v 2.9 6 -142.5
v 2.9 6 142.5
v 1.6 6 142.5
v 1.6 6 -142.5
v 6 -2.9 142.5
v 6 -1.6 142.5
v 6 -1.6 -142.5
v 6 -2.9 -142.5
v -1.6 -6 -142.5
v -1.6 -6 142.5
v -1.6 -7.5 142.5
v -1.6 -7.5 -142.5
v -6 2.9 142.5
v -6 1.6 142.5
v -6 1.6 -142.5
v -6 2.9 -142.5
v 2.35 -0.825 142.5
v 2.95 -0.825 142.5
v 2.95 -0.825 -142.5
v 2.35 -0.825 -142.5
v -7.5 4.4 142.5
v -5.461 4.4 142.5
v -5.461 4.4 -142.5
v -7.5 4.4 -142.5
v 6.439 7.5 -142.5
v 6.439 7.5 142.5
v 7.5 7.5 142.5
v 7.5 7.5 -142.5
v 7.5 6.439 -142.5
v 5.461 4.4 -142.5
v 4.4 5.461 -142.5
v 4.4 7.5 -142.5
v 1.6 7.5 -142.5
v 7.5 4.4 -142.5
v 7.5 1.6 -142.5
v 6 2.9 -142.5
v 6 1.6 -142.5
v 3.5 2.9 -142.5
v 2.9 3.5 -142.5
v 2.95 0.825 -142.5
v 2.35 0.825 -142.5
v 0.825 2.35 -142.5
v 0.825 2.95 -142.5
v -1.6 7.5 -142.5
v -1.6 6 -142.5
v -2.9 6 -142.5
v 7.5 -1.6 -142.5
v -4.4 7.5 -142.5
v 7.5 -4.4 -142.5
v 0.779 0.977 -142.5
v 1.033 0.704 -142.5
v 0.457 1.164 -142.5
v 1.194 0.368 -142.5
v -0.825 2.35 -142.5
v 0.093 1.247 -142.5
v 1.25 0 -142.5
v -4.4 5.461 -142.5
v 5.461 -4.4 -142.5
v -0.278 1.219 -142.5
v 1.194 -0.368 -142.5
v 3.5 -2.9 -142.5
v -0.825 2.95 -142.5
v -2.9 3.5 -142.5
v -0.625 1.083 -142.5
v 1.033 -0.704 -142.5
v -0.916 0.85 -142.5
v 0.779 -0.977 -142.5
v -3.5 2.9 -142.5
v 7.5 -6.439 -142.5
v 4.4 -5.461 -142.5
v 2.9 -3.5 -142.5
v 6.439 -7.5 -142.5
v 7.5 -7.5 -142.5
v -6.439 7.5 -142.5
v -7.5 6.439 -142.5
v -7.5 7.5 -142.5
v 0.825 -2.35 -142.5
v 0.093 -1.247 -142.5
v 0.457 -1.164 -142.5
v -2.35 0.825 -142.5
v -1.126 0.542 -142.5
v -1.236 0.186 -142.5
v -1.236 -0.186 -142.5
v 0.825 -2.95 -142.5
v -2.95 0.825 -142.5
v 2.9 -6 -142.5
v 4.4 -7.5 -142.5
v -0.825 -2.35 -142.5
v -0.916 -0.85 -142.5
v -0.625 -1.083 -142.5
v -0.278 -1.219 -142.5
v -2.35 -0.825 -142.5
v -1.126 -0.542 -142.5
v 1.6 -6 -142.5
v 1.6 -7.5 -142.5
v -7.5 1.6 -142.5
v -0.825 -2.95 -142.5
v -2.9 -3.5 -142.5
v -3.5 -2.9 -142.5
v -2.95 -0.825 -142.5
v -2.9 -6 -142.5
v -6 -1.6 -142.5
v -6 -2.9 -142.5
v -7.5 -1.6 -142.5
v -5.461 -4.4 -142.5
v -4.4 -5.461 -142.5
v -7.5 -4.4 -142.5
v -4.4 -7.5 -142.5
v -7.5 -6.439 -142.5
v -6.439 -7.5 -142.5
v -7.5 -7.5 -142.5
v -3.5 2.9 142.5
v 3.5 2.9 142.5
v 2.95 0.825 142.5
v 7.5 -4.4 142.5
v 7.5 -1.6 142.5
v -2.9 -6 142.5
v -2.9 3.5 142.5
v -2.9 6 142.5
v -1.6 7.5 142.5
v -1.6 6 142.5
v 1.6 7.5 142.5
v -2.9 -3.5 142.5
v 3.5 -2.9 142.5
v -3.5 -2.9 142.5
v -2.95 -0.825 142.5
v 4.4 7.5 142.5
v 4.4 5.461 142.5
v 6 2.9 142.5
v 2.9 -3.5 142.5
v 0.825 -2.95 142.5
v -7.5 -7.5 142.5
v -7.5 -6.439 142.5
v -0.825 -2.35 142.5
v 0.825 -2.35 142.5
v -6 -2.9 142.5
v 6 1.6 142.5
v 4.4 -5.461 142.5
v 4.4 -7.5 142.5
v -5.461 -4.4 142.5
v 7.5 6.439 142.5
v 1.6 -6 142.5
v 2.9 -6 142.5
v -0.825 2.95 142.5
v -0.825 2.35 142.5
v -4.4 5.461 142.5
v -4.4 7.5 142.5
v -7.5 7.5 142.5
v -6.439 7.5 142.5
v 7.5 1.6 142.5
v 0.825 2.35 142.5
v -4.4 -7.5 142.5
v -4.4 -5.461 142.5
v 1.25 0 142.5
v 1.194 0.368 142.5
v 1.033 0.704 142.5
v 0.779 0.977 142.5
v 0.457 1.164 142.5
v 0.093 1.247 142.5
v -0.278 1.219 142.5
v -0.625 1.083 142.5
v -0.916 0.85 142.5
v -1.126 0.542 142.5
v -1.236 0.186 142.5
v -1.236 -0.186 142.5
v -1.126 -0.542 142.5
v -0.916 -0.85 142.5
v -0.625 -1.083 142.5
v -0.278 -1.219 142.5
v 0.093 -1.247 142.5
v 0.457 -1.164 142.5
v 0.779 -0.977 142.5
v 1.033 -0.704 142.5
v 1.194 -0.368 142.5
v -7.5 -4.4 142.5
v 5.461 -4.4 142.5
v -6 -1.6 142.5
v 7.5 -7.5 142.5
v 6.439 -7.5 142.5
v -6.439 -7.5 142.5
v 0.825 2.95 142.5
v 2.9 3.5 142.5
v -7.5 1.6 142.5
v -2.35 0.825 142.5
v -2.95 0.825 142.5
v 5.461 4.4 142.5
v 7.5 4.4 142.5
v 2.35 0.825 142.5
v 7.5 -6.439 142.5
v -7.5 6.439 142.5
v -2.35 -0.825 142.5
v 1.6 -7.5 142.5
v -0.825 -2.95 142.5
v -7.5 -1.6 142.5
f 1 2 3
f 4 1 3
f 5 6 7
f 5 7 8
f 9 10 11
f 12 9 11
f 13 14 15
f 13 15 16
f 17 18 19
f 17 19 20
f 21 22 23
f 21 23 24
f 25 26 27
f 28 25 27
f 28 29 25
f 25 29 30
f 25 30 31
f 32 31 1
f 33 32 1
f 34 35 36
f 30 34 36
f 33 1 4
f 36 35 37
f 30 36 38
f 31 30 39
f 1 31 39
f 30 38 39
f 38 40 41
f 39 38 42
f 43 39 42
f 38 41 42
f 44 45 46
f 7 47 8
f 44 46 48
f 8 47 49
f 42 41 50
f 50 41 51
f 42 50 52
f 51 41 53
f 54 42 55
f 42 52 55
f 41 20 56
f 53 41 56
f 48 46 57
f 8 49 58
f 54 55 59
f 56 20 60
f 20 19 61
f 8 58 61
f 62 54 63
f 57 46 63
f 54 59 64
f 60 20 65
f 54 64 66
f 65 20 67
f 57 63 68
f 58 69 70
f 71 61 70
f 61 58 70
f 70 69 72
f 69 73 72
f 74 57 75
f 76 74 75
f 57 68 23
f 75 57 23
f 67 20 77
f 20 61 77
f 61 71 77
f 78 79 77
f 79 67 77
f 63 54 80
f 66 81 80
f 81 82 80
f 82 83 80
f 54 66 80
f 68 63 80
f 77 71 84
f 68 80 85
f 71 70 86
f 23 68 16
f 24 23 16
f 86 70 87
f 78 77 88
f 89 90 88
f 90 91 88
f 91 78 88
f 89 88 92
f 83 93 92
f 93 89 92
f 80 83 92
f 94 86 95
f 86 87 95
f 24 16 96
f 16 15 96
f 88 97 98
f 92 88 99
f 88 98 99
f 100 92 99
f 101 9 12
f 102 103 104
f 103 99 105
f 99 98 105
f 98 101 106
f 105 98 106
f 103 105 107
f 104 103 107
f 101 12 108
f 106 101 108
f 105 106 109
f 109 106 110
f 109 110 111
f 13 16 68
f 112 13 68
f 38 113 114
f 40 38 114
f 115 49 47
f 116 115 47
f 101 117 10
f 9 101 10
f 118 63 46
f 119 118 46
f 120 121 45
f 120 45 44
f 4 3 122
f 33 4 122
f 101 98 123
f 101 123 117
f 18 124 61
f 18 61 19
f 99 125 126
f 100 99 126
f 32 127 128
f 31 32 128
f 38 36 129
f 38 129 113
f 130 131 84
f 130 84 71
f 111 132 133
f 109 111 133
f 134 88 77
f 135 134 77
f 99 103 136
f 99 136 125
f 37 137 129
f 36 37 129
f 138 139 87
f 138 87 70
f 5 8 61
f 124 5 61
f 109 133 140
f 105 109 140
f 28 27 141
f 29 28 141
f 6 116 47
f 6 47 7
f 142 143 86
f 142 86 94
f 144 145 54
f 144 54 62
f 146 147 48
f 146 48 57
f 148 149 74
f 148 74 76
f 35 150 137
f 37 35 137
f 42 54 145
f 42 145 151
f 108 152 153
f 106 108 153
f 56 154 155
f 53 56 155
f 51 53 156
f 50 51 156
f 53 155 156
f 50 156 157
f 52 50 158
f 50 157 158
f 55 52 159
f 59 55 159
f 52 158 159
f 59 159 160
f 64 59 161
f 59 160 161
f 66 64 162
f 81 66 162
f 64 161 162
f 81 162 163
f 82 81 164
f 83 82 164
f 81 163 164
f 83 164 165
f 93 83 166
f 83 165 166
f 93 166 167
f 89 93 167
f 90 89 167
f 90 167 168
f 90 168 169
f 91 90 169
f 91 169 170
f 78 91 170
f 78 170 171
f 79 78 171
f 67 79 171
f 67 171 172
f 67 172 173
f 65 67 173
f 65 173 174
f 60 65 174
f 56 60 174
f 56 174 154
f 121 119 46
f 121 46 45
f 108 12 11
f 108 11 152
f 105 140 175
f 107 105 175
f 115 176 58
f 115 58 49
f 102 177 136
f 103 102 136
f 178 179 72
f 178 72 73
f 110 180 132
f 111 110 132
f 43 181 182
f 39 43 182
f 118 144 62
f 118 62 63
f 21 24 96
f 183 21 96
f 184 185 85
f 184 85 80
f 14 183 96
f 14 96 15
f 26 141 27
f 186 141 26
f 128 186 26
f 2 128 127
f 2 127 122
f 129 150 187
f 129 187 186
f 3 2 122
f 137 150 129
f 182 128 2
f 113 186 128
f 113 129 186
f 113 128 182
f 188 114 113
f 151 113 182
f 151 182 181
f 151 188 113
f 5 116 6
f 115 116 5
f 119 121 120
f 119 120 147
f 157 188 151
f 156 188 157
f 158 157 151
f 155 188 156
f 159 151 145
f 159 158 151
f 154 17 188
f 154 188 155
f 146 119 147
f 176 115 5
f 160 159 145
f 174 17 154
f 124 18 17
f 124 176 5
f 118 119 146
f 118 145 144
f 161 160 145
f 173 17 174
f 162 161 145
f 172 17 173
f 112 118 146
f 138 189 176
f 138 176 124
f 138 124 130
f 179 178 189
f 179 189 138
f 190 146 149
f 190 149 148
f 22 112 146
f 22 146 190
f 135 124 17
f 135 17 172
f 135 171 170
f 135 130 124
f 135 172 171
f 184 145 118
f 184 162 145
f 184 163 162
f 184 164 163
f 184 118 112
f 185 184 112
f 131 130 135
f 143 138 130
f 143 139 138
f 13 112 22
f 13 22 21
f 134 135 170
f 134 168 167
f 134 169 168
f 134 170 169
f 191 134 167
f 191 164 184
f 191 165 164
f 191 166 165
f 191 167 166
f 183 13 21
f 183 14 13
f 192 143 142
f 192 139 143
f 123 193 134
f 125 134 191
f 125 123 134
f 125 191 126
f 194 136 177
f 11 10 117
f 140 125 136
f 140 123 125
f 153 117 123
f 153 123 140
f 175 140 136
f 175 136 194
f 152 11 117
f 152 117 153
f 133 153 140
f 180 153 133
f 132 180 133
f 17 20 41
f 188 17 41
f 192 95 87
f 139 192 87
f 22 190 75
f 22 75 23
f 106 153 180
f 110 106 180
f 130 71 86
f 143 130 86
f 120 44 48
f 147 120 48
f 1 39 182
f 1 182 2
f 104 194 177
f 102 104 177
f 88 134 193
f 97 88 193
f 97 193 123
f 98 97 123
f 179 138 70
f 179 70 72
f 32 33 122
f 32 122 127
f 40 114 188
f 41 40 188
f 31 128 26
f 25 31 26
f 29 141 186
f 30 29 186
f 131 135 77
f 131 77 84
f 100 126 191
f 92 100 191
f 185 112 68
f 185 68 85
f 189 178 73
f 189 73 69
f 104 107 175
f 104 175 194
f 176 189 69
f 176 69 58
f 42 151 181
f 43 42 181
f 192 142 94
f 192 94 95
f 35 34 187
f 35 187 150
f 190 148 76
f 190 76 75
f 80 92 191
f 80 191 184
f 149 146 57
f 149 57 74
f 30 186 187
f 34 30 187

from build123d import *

# Parameters (mm, degrees)
RESSALTO_EXTRUS_O1_DEPTH   = 142.5
ESPELHAR2_COPY_1_DEPTH     = 142.5
ESBO_O2_R                  = 1.25
CORTE_EXTRUS_O1_DEPTH      = 1
CORTE_EXTRUS_O1_DEPTH_BACK = 286


with BuildPart() as part:
    # Esboço1 → Ressalto-extrusão1 (new body, symmetric)
    with BuildSketch(Plane.XY):
        Polygon((0, 2.35), (-0.825, 2.35), (-0.825, 2.95), (-2.9, 3.5), (-2.9, 6), (-1.6, 6), (-1.6, 7.5), (-4.4, 7.5), (-4.4, 5.460660172), (-6.439339828, 7.5), (-7.5, 7.5), (-7.5, 6.439339828), (-5.460660172, 4.4), (-7.5, 4.4), (-7.5, 1.6), (-6, 1.6), (-6, 2.9), (-3.5, 2.9), (-2.95, 0.825), (-2.35, 0.825), (-2.35, 0), (0, 0), align=None)
    ressalto_extrus_o1 = extrude(amount=RESSALTO_EXTRUS_O1_DEPTH, both=True)

    # Espelhar1: Ressalto-extrusão1 across plane
    add(ressalto_extrus_o1.mirror(Plane.ZX))

    # Espelhar2: Ressalto-extrusão1 across plane
    add(ressalto_extrus_o1.mirror(Plane(origin=(0, 0, 0), x_dir=(0, 0, 1), z_dir=(1, 0, 0))))

    # Espelhar2 copy 1 sketch → Espelhar2 copy 1 (add, symmetric)
    with BuildSketch(Plane(origin=(0, 0, 0), x_dir=(-1, 0, 0), z_dir=(0, 0, 1))):
        Polygon((0, 2.35), (-0.825, 2.35), (-0.825, 2.95), (-2.9, 3.5), (-2.9, 6), (-1.6, 6), (-1.6, 7.5), (-4.4, 7.5), (-4.4, 5.460660172), (-6.439339828, 7.5), (-7.5, 7.5), (-7.5, 6.439339828), (-5.460660172, 4.4), (-7.5, 4.4), (-7.5, 1.6), (-6, 1.6), (-6, 2.9), (-3.5, 2.9), (-2.95, 0.825), (-2.35, 0.825), (-2.35, 0), (0, 0), align=None)
    extrude(amount=ESPELHAR2_COPY_1_DEPTH, both=True)

    # Esboço2 → Corte-extrusão1 (cut, two sides)
    with BuildSketch(Plane.XY.offset(142.5)) as corte_extrus_o1_sk:
        Circle(ESBO_O2_R)
    extrude(amount=CORTE_EXTRUS_O1_DEPTH, mode=Mode.SUBTRACT)
    extrude(corte_extrus_o1_sk.sketch, amount=-CORTE_EXTRUS_O1_DEPTH_BACK, mode=Mode.SUBTRACT)


solid = part.part
